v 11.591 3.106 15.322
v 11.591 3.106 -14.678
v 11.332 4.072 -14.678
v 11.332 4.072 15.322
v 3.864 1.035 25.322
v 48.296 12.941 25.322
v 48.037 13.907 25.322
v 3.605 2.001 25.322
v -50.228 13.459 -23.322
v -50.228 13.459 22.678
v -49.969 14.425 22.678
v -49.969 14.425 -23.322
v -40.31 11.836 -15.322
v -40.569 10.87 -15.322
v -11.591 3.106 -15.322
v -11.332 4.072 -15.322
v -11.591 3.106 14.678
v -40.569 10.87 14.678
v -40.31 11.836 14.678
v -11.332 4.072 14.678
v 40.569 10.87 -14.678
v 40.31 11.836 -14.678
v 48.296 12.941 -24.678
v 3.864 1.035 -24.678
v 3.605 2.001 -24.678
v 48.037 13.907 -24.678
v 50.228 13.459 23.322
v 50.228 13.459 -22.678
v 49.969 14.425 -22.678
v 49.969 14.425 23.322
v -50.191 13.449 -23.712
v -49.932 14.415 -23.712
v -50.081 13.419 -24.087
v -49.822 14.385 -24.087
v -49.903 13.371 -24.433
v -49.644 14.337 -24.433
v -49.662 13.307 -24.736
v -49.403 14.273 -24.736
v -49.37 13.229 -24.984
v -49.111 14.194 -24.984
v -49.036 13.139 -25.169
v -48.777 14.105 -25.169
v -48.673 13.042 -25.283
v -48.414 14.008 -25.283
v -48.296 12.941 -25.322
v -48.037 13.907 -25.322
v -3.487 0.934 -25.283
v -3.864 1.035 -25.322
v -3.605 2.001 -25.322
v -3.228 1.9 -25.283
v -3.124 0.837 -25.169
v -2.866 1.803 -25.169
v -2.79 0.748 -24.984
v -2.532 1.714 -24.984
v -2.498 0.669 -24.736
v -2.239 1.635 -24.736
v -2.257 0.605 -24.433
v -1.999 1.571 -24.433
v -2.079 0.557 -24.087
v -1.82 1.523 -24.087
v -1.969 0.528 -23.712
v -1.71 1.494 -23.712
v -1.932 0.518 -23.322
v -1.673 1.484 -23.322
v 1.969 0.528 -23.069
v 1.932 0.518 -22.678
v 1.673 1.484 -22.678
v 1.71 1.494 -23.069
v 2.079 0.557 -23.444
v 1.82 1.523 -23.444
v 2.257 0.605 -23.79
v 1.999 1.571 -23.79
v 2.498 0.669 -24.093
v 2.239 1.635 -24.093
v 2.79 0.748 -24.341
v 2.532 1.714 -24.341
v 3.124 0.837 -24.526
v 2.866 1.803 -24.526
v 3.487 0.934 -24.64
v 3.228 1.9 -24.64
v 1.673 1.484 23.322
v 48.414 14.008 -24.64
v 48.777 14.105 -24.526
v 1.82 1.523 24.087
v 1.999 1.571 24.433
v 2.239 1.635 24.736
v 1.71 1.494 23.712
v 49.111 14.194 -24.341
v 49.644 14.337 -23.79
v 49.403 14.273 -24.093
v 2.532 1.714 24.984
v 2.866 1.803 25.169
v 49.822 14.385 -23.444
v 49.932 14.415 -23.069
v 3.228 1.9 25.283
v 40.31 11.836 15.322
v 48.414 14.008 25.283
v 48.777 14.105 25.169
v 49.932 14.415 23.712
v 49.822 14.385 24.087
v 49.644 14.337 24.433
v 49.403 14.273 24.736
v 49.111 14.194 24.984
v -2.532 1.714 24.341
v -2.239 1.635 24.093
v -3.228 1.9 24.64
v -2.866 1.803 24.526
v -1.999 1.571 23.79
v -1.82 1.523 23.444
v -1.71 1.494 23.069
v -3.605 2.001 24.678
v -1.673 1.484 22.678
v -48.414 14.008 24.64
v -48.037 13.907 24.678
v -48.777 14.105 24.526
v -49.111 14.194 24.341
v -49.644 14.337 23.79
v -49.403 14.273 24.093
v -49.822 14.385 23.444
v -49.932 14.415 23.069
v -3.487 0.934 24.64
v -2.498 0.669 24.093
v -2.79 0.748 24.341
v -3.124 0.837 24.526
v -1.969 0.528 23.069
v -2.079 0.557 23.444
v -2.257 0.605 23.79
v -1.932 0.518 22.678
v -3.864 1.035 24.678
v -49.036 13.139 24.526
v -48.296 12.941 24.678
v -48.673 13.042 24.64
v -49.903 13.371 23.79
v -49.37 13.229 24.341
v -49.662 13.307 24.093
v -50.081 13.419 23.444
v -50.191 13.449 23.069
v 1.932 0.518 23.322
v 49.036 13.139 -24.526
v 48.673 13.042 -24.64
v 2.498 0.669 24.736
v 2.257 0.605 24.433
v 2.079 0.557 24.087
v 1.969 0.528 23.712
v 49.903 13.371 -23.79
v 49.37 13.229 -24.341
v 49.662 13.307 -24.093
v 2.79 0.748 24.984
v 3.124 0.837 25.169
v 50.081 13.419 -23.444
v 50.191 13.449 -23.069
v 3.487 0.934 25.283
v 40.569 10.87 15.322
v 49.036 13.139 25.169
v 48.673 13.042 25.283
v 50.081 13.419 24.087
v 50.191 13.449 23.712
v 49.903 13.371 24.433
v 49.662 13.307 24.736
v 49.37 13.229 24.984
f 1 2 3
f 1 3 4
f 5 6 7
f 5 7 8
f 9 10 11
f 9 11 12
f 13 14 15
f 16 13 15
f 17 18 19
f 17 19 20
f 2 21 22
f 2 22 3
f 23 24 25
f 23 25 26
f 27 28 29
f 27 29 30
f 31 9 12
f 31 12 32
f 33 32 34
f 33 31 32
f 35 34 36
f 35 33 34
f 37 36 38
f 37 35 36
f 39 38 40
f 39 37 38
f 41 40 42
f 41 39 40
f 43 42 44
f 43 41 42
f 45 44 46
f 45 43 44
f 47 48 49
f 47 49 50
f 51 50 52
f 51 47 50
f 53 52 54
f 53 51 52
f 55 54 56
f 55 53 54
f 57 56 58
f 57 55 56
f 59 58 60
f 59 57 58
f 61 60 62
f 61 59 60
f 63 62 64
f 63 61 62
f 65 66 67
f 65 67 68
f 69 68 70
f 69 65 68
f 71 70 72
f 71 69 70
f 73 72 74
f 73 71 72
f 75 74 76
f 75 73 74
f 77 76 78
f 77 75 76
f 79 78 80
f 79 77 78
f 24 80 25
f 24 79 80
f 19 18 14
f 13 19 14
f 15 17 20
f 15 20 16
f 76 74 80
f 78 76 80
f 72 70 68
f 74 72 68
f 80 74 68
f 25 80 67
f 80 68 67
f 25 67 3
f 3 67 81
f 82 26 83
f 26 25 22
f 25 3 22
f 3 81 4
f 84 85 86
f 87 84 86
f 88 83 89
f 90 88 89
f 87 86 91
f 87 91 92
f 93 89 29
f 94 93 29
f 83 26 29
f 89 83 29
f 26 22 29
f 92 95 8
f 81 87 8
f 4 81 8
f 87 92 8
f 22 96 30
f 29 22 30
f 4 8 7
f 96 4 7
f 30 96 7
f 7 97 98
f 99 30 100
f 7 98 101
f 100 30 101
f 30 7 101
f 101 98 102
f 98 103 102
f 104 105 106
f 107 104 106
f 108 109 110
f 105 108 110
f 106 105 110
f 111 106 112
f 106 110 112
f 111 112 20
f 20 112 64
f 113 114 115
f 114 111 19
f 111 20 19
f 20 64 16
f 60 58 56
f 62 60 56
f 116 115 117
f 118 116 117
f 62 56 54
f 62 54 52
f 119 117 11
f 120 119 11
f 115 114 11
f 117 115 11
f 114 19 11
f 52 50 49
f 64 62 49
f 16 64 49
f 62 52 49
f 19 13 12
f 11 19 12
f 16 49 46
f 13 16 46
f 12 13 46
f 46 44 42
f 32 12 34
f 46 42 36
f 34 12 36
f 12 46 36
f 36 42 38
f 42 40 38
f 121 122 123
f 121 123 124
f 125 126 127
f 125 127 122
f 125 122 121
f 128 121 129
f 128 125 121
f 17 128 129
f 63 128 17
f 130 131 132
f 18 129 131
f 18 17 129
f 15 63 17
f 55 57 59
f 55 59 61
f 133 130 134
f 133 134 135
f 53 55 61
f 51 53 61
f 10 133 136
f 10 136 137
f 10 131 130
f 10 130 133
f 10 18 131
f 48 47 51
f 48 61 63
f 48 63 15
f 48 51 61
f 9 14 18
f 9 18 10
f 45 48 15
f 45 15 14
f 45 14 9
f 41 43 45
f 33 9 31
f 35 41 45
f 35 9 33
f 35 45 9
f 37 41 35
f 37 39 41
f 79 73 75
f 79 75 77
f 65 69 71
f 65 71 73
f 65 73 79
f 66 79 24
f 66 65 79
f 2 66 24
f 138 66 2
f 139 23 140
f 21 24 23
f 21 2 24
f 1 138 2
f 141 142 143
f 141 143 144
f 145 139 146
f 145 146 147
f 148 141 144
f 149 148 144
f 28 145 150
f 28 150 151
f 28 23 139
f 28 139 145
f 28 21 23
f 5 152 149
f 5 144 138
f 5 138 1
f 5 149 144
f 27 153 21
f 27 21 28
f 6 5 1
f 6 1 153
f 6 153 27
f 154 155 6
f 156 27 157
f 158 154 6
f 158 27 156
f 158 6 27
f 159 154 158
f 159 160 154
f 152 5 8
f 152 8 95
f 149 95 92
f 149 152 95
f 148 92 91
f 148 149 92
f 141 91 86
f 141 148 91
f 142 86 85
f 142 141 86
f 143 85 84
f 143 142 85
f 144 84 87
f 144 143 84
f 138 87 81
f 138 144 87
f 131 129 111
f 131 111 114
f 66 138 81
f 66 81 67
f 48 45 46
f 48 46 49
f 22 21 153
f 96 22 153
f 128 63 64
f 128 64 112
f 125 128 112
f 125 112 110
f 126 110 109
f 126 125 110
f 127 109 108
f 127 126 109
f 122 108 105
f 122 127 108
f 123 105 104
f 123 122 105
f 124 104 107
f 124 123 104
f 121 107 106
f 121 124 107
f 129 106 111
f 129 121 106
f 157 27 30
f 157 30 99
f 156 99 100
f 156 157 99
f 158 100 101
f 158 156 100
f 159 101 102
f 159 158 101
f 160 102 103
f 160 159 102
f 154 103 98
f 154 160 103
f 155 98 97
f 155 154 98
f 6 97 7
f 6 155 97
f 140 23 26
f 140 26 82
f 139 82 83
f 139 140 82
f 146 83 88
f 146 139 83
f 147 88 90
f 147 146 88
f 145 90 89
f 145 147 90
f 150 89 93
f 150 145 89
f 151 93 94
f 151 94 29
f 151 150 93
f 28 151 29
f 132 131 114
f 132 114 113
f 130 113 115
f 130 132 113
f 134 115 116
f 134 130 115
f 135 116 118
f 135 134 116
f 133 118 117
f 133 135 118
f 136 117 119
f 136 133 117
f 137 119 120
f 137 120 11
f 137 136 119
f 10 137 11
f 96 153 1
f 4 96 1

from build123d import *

# Parameters (mm, degrees)
SKETCH_1_W               = 30
SKETCH_1_H               = 30
EXTRUDE_1_DEPTH          = 1
MOVE_BODY_1_ANGLE        = 15
PATTERN_CIRCULAR_1_COUNT = 2


with BuildPart() as part:
    # 草图1 → 凸台-拉伸1 (new body)
    with BuildSketch(Plane(origin=(0, 0, 0), x_dir=(1, 0, 0), z_dir=(0, 1, 0))):
        with BuildLine():
            Line((-50, 25.321543408), (-4, 25.321543408))
            ThreePointArc((-4, 25.321543408), (-2.585786438, 24.735756971), (-2, 23.321543408))
            Line((-2, 23.321543408), (-2, -22.678456592))
            ThreePointArc((-2, -22.678456592), (-2.585786438, -24.092670154), (-4, -24.678456592))
            Line((-4, -24.678456592), (-50, -24.678456592))
            ThreePointArc((-50, -24.678456592), (-51.414213562, -24.092670154), (-52, -22.678456592))
            Line((-52, -22.678456592), (-52, 23.321543408))
            ThreePointArc((-52, 23.321543408), (-51.414213562, 24.735756971), (-50, 25.321543408))
        make_face()
        with Locations((-27, 0.321543408)):
            Rectangle(SKETCH_1_W, SKETCH_1_H, mode=Mode.SUBTRACT)
    extrude(amount=EXTRUDE_1_DEPTH)


with BuildPart() as part_1:
    # Move Body 1: moved
    add(part.part.rotate(Axis((0, 0, 0), (0, 0, -1)), MOVE_BODY_1_ANGLE))


with BuildPart() as pattern_circular_1_1:
    # 阵列(圆周)1: pattern copy
    add(part_1.part.rotate(Axis((0, 0, 0), (0, 1, 0)), 1 * 360 / PATTERN_CIRCULAR_1_COUNT))


solid = Compound([part_1.part, pattern_circular_1_1.part])
